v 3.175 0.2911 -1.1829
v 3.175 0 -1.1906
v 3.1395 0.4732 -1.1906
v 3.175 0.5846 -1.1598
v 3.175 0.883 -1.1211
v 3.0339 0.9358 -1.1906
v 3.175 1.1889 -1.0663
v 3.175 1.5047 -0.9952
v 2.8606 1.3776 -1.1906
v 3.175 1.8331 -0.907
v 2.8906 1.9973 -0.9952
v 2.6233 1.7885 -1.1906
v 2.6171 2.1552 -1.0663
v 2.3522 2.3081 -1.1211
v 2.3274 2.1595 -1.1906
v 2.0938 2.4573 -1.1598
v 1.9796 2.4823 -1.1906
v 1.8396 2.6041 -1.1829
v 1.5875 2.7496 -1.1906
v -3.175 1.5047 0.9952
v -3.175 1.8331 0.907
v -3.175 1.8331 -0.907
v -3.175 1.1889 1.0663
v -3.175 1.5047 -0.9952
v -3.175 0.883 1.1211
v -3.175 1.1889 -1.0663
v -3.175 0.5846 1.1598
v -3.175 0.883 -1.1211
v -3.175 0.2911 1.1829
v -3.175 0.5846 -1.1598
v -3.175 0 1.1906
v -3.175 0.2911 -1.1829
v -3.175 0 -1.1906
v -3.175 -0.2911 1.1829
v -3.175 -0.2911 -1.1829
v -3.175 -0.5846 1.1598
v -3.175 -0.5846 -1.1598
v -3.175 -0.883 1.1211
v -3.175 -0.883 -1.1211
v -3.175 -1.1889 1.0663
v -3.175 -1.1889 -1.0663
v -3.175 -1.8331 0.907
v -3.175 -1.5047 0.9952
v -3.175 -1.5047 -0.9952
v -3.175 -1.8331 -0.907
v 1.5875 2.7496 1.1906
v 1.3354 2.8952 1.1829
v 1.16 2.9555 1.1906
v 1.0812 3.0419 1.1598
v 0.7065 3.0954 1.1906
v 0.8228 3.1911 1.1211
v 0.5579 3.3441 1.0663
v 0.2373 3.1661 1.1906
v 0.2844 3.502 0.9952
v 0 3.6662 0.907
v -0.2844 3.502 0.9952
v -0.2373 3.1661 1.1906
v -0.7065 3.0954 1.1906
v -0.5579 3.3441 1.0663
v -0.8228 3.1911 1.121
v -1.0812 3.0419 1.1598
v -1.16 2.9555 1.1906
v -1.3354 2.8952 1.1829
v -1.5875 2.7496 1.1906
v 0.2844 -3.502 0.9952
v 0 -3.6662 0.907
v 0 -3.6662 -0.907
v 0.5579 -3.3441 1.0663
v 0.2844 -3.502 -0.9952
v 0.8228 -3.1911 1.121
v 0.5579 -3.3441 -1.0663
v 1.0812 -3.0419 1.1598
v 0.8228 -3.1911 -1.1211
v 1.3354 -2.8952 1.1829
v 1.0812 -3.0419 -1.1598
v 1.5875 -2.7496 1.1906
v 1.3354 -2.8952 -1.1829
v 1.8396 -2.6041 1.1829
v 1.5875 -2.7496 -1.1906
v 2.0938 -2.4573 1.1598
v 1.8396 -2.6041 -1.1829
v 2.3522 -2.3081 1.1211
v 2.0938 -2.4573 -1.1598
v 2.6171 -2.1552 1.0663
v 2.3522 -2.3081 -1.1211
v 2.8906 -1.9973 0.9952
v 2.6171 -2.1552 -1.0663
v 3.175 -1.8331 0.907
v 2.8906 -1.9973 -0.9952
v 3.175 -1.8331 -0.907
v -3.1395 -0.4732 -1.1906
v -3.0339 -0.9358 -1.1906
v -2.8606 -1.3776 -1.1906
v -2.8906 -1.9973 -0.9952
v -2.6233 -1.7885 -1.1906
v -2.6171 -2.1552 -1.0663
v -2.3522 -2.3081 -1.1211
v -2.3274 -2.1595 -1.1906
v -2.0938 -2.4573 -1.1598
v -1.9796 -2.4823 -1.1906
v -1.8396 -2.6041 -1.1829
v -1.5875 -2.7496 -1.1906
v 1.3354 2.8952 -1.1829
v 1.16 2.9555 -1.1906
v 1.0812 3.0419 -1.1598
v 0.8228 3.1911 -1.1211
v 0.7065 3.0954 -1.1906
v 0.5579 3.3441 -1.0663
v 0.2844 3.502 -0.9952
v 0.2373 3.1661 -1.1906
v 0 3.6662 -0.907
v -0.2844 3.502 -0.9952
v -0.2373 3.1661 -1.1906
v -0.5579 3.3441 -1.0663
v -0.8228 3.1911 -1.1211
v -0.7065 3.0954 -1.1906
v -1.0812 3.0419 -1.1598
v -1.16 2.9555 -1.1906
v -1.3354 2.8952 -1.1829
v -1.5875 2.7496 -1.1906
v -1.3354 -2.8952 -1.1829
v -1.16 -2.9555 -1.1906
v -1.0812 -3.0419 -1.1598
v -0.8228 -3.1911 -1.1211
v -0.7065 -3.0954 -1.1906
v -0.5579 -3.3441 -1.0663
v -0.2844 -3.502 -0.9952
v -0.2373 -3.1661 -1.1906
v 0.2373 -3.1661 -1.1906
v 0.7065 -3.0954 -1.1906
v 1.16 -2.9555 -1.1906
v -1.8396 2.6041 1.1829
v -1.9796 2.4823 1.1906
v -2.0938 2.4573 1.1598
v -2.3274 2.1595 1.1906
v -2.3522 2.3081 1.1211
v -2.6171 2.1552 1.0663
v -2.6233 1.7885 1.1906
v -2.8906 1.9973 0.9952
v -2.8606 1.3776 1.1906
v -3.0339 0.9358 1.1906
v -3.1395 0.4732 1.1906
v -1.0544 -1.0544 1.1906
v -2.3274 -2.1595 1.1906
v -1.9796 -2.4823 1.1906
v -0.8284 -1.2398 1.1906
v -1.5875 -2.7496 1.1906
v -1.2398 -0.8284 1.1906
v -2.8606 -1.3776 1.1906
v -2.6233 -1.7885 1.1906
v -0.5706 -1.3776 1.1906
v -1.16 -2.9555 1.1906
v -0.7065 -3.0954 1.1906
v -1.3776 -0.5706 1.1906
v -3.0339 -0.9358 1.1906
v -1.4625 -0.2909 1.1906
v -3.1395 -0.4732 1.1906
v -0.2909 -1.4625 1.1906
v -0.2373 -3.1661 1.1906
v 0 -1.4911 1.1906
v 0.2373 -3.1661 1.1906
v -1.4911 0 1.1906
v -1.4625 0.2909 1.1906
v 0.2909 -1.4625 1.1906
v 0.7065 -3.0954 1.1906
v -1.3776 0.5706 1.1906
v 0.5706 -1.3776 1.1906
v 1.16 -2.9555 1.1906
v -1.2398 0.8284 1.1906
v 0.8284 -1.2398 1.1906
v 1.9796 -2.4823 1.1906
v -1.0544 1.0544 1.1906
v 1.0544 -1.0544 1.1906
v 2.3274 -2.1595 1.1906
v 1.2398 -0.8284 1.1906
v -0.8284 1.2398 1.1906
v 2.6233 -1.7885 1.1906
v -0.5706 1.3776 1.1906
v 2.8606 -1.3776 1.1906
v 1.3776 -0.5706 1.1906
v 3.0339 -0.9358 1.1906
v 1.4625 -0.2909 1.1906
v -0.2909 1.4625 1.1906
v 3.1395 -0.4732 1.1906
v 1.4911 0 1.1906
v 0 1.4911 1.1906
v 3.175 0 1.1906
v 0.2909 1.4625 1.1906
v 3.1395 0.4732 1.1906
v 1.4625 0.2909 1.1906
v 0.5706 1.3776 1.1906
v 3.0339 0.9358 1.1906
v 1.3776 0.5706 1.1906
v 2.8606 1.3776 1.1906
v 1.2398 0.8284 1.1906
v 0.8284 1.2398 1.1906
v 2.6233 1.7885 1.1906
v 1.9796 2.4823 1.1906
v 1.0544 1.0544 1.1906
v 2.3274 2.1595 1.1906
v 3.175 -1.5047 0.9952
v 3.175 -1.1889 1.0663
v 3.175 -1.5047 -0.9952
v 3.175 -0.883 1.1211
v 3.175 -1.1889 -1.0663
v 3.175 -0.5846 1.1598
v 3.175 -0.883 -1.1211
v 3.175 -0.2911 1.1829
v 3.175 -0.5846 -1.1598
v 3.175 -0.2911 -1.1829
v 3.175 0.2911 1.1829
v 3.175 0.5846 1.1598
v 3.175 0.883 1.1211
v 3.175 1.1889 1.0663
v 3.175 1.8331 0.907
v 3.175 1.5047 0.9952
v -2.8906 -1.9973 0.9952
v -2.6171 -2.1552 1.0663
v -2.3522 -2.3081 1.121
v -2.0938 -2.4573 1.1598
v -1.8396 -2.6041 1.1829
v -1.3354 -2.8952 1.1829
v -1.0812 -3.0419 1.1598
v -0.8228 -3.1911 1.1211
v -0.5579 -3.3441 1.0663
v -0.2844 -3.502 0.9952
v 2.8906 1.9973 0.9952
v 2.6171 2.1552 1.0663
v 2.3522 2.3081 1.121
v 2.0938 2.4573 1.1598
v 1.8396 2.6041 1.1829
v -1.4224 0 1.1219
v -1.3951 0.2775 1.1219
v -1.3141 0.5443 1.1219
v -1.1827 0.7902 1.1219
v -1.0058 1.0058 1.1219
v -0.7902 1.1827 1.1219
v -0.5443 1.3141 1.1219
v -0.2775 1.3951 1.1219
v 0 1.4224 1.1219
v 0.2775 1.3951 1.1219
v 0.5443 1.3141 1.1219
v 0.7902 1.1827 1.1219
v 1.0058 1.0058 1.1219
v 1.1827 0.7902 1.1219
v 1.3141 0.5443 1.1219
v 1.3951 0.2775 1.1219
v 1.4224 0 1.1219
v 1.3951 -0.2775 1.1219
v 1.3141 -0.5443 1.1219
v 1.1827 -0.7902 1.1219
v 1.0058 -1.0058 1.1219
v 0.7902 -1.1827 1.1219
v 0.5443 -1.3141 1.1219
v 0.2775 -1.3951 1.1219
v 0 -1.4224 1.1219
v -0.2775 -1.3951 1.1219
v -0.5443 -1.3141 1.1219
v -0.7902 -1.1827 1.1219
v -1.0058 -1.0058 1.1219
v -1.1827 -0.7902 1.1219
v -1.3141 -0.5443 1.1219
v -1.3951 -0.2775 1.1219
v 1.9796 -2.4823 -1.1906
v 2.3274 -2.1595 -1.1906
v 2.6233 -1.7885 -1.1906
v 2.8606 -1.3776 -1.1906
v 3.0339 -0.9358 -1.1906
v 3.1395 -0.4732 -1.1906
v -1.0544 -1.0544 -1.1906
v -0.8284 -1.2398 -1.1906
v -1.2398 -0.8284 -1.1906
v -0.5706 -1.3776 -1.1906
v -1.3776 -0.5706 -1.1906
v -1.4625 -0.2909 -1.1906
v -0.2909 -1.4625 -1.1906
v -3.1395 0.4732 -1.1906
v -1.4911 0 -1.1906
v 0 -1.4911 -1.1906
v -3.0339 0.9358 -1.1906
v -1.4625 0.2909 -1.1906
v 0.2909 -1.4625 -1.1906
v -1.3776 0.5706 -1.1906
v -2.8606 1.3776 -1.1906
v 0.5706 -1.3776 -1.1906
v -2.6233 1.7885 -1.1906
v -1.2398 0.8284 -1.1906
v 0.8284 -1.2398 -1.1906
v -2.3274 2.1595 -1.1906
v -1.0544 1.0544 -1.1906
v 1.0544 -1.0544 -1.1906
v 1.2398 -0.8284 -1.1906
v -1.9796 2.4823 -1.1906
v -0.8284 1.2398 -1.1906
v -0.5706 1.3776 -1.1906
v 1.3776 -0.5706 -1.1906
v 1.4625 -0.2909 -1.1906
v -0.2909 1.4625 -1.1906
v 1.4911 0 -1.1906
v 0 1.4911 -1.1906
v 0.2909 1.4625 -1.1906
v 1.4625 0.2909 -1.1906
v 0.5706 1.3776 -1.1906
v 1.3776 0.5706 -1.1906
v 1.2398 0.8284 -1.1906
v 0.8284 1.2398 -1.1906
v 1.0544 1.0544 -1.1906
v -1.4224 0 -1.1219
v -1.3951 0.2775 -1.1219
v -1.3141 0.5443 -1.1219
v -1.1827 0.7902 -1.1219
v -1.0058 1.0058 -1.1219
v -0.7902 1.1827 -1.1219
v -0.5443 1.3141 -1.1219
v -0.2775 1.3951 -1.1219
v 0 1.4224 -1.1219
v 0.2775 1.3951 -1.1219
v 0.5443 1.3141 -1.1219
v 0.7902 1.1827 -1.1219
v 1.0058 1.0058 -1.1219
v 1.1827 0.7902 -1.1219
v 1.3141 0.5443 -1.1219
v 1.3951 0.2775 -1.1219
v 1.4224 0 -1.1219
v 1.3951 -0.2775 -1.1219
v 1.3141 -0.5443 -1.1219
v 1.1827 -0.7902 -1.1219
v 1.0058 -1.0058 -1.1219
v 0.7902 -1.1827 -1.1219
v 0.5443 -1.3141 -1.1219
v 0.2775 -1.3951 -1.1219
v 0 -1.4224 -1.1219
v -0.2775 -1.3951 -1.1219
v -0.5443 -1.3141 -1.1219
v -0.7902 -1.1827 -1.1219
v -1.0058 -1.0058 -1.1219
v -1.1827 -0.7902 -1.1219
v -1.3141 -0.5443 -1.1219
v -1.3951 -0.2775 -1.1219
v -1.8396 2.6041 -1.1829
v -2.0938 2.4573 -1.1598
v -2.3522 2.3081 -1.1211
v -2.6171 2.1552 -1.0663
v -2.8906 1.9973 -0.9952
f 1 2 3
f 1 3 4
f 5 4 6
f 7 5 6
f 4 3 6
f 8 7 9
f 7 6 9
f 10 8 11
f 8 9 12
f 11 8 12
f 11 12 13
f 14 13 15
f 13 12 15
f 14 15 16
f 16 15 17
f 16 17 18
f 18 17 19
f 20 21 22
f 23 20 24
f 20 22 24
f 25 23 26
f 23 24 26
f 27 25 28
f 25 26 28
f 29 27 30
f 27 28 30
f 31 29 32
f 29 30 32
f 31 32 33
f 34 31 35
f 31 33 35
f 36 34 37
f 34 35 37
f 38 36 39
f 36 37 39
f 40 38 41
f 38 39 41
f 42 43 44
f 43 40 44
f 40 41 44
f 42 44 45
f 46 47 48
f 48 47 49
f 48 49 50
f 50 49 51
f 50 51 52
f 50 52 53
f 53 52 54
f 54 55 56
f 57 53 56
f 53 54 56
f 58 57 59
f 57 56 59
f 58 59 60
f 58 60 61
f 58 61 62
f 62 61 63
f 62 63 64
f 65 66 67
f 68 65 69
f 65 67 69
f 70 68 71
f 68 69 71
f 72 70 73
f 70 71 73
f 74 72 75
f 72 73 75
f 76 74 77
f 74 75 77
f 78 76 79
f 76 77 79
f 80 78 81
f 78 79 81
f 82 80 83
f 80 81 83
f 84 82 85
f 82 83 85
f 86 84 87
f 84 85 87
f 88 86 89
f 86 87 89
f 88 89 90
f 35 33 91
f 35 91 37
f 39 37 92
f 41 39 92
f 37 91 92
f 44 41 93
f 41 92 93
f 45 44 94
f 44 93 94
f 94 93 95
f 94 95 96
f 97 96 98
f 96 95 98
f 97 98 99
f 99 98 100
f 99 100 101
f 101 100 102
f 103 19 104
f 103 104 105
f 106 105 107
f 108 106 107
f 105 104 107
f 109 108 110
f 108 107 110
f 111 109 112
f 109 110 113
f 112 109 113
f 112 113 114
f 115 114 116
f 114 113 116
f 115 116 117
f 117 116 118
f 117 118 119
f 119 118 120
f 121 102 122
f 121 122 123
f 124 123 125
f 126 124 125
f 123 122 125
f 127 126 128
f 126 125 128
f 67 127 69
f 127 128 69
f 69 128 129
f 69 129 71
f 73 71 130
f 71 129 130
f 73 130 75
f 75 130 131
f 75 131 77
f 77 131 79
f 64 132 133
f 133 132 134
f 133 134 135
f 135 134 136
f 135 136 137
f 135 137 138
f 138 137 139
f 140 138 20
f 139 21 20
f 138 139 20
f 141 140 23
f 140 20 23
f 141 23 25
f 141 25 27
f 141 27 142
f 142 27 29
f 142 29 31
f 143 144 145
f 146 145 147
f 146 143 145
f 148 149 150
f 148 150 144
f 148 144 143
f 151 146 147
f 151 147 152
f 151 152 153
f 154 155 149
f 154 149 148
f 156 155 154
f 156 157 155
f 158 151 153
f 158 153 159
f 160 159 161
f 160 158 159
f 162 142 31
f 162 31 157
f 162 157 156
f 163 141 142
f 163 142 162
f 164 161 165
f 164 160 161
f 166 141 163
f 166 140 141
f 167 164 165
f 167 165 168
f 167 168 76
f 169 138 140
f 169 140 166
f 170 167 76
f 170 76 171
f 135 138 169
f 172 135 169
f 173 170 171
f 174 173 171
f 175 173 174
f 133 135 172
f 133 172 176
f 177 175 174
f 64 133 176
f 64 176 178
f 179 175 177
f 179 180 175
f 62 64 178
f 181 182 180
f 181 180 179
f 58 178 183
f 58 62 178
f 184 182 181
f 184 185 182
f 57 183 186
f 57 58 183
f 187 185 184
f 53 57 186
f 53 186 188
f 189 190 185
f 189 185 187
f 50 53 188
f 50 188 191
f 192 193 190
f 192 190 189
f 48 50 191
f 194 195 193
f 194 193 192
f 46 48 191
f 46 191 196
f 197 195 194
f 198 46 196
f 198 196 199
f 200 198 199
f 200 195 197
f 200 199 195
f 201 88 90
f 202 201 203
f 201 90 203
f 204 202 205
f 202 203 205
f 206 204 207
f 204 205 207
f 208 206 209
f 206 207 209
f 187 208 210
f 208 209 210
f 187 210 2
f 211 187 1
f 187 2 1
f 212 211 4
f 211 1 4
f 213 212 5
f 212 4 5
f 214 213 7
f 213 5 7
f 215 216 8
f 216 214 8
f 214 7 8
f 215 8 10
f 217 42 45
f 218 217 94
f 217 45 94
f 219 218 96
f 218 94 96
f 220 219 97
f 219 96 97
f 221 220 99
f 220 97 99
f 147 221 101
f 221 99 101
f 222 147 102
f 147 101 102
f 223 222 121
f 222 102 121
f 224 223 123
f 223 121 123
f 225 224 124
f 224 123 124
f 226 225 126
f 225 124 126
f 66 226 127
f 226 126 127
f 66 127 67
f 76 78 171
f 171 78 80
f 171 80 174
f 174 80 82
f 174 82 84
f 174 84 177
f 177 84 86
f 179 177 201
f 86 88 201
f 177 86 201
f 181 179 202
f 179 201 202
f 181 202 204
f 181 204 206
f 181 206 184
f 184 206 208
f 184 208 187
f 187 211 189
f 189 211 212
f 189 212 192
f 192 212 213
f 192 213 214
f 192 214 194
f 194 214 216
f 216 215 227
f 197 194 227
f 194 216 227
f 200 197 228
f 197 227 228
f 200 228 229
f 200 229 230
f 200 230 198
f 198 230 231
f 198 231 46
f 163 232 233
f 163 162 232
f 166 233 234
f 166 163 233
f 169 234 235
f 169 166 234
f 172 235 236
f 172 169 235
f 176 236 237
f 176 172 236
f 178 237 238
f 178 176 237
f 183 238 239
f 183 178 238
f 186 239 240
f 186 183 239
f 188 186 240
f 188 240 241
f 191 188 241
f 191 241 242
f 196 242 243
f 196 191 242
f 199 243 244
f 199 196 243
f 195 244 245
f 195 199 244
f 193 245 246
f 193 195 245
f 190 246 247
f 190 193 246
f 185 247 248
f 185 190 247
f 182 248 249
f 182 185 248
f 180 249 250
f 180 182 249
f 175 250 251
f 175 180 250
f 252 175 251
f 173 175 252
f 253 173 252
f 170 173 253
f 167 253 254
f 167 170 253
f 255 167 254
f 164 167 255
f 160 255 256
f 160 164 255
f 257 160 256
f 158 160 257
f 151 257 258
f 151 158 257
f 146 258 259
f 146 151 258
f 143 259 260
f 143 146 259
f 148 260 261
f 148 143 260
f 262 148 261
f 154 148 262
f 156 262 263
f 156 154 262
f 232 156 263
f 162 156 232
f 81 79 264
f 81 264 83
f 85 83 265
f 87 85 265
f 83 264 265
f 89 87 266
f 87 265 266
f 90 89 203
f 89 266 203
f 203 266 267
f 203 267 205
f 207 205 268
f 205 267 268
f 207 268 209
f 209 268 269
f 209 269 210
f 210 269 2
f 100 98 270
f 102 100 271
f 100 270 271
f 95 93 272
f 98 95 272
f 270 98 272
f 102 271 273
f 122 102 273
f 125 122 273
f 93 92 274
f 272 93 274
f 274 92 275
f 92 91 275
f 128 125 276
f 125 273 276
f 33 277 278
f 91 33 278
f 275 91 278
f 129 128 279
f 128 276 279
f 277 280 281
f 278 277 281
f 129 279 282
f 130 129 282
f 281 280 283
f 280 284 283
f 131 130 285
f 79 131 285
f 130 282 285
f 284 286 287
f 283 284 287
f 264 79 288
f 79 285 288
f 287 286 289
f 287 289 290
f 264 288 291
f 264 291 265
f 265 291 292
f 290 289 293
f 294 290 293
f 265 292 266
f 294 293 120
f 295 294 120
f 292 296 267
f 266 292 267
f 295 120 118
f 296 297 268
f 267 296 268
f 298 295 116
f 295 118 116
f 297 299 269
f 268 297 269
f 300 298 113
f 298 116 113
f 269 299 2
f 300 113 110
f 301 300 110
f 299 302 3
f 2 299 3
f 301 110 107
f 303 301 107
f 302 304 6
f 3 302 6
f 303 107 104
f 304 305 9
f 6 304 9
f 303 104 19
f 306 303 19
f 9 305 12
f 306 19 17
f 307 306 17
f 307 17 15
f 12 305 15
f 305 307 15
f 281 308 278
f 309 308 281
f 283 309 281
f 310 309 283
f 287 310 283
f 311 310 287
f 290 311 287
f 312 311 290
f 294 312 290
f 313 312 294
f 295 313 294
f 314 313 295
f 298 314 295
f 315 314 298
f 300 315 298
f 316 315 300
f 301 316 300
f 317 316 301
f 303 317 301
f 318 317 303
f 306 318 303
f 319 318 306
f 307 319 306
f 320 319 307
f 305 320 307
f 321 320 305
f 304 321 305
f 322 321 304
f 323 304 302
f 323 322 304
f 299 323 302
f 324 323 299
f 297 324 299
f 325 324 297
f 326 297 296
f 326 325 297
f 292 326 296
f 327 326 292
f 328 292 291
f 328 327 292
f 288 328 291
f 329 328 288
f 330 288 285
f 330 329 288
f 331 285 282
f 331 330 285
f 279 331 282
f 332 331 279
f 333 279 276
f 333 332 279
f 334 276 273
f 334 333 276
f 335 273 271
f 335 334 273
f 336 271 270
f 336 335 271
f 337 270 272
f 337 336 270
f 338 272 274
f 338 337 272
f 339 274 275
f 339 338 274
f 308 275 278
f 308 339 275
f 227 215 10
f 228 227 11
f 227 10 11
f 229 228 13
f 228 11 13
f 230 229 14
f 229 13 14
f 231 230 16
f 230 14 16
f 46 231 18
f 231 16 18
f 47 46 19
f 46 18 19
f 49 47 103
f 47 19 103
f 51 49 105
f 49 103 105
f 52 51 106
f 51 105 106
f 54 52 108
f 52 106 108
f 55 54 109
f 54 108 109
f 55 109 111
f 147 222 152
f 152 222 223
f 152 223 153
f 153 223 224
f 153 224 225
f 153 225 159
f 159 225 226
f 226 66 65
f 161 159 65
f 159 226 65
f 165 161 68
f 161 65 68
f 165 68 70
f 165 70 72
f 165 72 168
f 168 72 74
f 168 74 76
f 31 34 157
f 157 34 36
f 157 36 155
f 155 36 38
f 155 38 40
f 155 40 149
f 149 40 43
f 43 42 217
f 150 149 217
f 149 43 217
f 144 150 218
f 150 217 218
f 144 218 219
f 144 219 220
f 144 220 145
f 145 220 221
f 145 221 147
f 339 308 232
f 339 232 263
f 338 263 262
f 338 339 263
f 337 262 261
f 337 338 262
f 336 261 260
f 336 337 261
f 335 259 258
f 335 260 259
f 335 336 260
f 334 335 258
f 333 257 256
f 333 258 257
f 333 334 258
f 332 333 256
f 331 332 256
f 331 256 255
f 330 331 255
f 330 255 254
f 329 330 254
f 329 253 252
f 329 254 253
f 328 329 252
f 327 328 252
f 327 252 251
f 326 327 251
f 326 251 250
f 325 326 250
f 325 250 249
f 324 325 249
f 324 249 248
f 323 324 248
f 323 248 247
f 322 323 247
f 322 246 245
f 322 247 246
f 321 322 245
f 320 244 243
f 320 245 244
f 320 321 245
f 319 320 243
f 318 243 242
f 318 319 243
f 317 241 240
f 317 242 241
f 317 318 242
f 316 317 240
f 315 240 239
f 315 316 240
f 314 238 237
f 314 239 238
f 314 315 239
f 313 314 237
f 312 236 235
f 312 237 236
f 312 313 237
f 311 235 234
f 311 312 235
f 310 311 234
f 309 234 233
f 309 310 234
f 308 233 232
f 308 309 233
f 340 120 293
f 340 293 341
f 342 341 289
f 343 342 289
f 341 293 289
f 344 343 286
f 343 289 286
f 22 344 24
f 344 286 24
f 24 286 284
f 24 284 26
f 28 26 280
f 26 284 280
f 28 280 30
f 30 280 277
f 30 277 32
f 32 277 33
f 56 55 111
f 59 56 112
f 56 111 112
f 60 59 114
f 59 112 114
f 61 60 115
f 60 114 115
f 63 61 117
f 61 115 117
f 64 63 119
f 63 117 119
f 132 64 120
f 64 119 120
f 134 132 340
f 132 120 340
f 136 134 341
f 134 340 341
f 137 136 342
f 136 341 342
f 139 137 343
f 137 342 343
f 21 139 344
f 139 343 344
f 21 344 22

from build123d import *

# Parameters (mm, degrees)
BOSS_EXTRUDE1_START = -1.190625
SKETCH3_R           = 1.4224
BOSS_EXTRUDE1_DEPTH = 2.38125


# Read off the part's stored shape, not the designer's step: Cut-Revolve1
with BuildPart() as part:
    # Sketch3 → Boss-Extrude1 (new body)
    with BuildSketch(Plane.XY.offset(BOSS_EXTRUDE1_START)):
        Polygon((-3.175, 1.833087105), (-3.175, -1.833087105), (0, -3.666174209), (3.175, -1.833087105), (3.175, 1.833087105), (0, 3.666174209), align=None)
        with Locations(Location((0, 0, 0), (0, 0, 180))):
            Circle(SKETCH3_R, mode=Mode.SUBTRACT)
    extrude(amount=BOSS_EXTRUDE1_DEPTH)

    # Cut-Revolve1 outline → Cut-Revolve1 (revolve, cut)
    with BuildSketch(Plane.XZ):
        Polygon((3.66617421, -0.907045438), (3.174999964, -1.190625021), (3.666174217, -1.190625256), align=None)
        Polygon((3.175, 1.190625), (3.66617421, 0.907045438), (3.666174217, 1.190625256), align=None)
    revolve(axis=Axis((0, 0, 0), (0, 0, 1)), mode=Mode.SUBTRACT)

    # Sketch9 → Cut-Revolve2 (revolve, cut)
    with BuildSketch(Plane(origin=(0, 0, 0), x_dir=(0, 0, -1), z_dir=(1, 0, 0)), mode=Mode.PRIVATE) as cut_revolve2_sk:
        Polygon((-1.121884234, 1.4224), (-1.7859375, 2.086453266), (-1.7859375, 1.4224), (-1.7859375, 0), (-1.121884234, 0), (-0.640698869, 0), (-0.640698869, 0.941214635), align=None)
        Polygon((1.7859375, 2.086453266), (1.7859375, 1.4224), (1.7859375, 0), (1.121884234, 0), (0.640698869, 0), (0.640698869, 0.941214635), (1.121884234, 1.4224), align=None)
    revolve(cut_revolve2_sk.sketch.rotate(Axis((0, 0, 1.190625), (0, 0, -1)), 270), axis=Axis((0, 0, 1.190625), (0, 0, -1)), mode=Mode.SUBTRACT)


solid = part.part
